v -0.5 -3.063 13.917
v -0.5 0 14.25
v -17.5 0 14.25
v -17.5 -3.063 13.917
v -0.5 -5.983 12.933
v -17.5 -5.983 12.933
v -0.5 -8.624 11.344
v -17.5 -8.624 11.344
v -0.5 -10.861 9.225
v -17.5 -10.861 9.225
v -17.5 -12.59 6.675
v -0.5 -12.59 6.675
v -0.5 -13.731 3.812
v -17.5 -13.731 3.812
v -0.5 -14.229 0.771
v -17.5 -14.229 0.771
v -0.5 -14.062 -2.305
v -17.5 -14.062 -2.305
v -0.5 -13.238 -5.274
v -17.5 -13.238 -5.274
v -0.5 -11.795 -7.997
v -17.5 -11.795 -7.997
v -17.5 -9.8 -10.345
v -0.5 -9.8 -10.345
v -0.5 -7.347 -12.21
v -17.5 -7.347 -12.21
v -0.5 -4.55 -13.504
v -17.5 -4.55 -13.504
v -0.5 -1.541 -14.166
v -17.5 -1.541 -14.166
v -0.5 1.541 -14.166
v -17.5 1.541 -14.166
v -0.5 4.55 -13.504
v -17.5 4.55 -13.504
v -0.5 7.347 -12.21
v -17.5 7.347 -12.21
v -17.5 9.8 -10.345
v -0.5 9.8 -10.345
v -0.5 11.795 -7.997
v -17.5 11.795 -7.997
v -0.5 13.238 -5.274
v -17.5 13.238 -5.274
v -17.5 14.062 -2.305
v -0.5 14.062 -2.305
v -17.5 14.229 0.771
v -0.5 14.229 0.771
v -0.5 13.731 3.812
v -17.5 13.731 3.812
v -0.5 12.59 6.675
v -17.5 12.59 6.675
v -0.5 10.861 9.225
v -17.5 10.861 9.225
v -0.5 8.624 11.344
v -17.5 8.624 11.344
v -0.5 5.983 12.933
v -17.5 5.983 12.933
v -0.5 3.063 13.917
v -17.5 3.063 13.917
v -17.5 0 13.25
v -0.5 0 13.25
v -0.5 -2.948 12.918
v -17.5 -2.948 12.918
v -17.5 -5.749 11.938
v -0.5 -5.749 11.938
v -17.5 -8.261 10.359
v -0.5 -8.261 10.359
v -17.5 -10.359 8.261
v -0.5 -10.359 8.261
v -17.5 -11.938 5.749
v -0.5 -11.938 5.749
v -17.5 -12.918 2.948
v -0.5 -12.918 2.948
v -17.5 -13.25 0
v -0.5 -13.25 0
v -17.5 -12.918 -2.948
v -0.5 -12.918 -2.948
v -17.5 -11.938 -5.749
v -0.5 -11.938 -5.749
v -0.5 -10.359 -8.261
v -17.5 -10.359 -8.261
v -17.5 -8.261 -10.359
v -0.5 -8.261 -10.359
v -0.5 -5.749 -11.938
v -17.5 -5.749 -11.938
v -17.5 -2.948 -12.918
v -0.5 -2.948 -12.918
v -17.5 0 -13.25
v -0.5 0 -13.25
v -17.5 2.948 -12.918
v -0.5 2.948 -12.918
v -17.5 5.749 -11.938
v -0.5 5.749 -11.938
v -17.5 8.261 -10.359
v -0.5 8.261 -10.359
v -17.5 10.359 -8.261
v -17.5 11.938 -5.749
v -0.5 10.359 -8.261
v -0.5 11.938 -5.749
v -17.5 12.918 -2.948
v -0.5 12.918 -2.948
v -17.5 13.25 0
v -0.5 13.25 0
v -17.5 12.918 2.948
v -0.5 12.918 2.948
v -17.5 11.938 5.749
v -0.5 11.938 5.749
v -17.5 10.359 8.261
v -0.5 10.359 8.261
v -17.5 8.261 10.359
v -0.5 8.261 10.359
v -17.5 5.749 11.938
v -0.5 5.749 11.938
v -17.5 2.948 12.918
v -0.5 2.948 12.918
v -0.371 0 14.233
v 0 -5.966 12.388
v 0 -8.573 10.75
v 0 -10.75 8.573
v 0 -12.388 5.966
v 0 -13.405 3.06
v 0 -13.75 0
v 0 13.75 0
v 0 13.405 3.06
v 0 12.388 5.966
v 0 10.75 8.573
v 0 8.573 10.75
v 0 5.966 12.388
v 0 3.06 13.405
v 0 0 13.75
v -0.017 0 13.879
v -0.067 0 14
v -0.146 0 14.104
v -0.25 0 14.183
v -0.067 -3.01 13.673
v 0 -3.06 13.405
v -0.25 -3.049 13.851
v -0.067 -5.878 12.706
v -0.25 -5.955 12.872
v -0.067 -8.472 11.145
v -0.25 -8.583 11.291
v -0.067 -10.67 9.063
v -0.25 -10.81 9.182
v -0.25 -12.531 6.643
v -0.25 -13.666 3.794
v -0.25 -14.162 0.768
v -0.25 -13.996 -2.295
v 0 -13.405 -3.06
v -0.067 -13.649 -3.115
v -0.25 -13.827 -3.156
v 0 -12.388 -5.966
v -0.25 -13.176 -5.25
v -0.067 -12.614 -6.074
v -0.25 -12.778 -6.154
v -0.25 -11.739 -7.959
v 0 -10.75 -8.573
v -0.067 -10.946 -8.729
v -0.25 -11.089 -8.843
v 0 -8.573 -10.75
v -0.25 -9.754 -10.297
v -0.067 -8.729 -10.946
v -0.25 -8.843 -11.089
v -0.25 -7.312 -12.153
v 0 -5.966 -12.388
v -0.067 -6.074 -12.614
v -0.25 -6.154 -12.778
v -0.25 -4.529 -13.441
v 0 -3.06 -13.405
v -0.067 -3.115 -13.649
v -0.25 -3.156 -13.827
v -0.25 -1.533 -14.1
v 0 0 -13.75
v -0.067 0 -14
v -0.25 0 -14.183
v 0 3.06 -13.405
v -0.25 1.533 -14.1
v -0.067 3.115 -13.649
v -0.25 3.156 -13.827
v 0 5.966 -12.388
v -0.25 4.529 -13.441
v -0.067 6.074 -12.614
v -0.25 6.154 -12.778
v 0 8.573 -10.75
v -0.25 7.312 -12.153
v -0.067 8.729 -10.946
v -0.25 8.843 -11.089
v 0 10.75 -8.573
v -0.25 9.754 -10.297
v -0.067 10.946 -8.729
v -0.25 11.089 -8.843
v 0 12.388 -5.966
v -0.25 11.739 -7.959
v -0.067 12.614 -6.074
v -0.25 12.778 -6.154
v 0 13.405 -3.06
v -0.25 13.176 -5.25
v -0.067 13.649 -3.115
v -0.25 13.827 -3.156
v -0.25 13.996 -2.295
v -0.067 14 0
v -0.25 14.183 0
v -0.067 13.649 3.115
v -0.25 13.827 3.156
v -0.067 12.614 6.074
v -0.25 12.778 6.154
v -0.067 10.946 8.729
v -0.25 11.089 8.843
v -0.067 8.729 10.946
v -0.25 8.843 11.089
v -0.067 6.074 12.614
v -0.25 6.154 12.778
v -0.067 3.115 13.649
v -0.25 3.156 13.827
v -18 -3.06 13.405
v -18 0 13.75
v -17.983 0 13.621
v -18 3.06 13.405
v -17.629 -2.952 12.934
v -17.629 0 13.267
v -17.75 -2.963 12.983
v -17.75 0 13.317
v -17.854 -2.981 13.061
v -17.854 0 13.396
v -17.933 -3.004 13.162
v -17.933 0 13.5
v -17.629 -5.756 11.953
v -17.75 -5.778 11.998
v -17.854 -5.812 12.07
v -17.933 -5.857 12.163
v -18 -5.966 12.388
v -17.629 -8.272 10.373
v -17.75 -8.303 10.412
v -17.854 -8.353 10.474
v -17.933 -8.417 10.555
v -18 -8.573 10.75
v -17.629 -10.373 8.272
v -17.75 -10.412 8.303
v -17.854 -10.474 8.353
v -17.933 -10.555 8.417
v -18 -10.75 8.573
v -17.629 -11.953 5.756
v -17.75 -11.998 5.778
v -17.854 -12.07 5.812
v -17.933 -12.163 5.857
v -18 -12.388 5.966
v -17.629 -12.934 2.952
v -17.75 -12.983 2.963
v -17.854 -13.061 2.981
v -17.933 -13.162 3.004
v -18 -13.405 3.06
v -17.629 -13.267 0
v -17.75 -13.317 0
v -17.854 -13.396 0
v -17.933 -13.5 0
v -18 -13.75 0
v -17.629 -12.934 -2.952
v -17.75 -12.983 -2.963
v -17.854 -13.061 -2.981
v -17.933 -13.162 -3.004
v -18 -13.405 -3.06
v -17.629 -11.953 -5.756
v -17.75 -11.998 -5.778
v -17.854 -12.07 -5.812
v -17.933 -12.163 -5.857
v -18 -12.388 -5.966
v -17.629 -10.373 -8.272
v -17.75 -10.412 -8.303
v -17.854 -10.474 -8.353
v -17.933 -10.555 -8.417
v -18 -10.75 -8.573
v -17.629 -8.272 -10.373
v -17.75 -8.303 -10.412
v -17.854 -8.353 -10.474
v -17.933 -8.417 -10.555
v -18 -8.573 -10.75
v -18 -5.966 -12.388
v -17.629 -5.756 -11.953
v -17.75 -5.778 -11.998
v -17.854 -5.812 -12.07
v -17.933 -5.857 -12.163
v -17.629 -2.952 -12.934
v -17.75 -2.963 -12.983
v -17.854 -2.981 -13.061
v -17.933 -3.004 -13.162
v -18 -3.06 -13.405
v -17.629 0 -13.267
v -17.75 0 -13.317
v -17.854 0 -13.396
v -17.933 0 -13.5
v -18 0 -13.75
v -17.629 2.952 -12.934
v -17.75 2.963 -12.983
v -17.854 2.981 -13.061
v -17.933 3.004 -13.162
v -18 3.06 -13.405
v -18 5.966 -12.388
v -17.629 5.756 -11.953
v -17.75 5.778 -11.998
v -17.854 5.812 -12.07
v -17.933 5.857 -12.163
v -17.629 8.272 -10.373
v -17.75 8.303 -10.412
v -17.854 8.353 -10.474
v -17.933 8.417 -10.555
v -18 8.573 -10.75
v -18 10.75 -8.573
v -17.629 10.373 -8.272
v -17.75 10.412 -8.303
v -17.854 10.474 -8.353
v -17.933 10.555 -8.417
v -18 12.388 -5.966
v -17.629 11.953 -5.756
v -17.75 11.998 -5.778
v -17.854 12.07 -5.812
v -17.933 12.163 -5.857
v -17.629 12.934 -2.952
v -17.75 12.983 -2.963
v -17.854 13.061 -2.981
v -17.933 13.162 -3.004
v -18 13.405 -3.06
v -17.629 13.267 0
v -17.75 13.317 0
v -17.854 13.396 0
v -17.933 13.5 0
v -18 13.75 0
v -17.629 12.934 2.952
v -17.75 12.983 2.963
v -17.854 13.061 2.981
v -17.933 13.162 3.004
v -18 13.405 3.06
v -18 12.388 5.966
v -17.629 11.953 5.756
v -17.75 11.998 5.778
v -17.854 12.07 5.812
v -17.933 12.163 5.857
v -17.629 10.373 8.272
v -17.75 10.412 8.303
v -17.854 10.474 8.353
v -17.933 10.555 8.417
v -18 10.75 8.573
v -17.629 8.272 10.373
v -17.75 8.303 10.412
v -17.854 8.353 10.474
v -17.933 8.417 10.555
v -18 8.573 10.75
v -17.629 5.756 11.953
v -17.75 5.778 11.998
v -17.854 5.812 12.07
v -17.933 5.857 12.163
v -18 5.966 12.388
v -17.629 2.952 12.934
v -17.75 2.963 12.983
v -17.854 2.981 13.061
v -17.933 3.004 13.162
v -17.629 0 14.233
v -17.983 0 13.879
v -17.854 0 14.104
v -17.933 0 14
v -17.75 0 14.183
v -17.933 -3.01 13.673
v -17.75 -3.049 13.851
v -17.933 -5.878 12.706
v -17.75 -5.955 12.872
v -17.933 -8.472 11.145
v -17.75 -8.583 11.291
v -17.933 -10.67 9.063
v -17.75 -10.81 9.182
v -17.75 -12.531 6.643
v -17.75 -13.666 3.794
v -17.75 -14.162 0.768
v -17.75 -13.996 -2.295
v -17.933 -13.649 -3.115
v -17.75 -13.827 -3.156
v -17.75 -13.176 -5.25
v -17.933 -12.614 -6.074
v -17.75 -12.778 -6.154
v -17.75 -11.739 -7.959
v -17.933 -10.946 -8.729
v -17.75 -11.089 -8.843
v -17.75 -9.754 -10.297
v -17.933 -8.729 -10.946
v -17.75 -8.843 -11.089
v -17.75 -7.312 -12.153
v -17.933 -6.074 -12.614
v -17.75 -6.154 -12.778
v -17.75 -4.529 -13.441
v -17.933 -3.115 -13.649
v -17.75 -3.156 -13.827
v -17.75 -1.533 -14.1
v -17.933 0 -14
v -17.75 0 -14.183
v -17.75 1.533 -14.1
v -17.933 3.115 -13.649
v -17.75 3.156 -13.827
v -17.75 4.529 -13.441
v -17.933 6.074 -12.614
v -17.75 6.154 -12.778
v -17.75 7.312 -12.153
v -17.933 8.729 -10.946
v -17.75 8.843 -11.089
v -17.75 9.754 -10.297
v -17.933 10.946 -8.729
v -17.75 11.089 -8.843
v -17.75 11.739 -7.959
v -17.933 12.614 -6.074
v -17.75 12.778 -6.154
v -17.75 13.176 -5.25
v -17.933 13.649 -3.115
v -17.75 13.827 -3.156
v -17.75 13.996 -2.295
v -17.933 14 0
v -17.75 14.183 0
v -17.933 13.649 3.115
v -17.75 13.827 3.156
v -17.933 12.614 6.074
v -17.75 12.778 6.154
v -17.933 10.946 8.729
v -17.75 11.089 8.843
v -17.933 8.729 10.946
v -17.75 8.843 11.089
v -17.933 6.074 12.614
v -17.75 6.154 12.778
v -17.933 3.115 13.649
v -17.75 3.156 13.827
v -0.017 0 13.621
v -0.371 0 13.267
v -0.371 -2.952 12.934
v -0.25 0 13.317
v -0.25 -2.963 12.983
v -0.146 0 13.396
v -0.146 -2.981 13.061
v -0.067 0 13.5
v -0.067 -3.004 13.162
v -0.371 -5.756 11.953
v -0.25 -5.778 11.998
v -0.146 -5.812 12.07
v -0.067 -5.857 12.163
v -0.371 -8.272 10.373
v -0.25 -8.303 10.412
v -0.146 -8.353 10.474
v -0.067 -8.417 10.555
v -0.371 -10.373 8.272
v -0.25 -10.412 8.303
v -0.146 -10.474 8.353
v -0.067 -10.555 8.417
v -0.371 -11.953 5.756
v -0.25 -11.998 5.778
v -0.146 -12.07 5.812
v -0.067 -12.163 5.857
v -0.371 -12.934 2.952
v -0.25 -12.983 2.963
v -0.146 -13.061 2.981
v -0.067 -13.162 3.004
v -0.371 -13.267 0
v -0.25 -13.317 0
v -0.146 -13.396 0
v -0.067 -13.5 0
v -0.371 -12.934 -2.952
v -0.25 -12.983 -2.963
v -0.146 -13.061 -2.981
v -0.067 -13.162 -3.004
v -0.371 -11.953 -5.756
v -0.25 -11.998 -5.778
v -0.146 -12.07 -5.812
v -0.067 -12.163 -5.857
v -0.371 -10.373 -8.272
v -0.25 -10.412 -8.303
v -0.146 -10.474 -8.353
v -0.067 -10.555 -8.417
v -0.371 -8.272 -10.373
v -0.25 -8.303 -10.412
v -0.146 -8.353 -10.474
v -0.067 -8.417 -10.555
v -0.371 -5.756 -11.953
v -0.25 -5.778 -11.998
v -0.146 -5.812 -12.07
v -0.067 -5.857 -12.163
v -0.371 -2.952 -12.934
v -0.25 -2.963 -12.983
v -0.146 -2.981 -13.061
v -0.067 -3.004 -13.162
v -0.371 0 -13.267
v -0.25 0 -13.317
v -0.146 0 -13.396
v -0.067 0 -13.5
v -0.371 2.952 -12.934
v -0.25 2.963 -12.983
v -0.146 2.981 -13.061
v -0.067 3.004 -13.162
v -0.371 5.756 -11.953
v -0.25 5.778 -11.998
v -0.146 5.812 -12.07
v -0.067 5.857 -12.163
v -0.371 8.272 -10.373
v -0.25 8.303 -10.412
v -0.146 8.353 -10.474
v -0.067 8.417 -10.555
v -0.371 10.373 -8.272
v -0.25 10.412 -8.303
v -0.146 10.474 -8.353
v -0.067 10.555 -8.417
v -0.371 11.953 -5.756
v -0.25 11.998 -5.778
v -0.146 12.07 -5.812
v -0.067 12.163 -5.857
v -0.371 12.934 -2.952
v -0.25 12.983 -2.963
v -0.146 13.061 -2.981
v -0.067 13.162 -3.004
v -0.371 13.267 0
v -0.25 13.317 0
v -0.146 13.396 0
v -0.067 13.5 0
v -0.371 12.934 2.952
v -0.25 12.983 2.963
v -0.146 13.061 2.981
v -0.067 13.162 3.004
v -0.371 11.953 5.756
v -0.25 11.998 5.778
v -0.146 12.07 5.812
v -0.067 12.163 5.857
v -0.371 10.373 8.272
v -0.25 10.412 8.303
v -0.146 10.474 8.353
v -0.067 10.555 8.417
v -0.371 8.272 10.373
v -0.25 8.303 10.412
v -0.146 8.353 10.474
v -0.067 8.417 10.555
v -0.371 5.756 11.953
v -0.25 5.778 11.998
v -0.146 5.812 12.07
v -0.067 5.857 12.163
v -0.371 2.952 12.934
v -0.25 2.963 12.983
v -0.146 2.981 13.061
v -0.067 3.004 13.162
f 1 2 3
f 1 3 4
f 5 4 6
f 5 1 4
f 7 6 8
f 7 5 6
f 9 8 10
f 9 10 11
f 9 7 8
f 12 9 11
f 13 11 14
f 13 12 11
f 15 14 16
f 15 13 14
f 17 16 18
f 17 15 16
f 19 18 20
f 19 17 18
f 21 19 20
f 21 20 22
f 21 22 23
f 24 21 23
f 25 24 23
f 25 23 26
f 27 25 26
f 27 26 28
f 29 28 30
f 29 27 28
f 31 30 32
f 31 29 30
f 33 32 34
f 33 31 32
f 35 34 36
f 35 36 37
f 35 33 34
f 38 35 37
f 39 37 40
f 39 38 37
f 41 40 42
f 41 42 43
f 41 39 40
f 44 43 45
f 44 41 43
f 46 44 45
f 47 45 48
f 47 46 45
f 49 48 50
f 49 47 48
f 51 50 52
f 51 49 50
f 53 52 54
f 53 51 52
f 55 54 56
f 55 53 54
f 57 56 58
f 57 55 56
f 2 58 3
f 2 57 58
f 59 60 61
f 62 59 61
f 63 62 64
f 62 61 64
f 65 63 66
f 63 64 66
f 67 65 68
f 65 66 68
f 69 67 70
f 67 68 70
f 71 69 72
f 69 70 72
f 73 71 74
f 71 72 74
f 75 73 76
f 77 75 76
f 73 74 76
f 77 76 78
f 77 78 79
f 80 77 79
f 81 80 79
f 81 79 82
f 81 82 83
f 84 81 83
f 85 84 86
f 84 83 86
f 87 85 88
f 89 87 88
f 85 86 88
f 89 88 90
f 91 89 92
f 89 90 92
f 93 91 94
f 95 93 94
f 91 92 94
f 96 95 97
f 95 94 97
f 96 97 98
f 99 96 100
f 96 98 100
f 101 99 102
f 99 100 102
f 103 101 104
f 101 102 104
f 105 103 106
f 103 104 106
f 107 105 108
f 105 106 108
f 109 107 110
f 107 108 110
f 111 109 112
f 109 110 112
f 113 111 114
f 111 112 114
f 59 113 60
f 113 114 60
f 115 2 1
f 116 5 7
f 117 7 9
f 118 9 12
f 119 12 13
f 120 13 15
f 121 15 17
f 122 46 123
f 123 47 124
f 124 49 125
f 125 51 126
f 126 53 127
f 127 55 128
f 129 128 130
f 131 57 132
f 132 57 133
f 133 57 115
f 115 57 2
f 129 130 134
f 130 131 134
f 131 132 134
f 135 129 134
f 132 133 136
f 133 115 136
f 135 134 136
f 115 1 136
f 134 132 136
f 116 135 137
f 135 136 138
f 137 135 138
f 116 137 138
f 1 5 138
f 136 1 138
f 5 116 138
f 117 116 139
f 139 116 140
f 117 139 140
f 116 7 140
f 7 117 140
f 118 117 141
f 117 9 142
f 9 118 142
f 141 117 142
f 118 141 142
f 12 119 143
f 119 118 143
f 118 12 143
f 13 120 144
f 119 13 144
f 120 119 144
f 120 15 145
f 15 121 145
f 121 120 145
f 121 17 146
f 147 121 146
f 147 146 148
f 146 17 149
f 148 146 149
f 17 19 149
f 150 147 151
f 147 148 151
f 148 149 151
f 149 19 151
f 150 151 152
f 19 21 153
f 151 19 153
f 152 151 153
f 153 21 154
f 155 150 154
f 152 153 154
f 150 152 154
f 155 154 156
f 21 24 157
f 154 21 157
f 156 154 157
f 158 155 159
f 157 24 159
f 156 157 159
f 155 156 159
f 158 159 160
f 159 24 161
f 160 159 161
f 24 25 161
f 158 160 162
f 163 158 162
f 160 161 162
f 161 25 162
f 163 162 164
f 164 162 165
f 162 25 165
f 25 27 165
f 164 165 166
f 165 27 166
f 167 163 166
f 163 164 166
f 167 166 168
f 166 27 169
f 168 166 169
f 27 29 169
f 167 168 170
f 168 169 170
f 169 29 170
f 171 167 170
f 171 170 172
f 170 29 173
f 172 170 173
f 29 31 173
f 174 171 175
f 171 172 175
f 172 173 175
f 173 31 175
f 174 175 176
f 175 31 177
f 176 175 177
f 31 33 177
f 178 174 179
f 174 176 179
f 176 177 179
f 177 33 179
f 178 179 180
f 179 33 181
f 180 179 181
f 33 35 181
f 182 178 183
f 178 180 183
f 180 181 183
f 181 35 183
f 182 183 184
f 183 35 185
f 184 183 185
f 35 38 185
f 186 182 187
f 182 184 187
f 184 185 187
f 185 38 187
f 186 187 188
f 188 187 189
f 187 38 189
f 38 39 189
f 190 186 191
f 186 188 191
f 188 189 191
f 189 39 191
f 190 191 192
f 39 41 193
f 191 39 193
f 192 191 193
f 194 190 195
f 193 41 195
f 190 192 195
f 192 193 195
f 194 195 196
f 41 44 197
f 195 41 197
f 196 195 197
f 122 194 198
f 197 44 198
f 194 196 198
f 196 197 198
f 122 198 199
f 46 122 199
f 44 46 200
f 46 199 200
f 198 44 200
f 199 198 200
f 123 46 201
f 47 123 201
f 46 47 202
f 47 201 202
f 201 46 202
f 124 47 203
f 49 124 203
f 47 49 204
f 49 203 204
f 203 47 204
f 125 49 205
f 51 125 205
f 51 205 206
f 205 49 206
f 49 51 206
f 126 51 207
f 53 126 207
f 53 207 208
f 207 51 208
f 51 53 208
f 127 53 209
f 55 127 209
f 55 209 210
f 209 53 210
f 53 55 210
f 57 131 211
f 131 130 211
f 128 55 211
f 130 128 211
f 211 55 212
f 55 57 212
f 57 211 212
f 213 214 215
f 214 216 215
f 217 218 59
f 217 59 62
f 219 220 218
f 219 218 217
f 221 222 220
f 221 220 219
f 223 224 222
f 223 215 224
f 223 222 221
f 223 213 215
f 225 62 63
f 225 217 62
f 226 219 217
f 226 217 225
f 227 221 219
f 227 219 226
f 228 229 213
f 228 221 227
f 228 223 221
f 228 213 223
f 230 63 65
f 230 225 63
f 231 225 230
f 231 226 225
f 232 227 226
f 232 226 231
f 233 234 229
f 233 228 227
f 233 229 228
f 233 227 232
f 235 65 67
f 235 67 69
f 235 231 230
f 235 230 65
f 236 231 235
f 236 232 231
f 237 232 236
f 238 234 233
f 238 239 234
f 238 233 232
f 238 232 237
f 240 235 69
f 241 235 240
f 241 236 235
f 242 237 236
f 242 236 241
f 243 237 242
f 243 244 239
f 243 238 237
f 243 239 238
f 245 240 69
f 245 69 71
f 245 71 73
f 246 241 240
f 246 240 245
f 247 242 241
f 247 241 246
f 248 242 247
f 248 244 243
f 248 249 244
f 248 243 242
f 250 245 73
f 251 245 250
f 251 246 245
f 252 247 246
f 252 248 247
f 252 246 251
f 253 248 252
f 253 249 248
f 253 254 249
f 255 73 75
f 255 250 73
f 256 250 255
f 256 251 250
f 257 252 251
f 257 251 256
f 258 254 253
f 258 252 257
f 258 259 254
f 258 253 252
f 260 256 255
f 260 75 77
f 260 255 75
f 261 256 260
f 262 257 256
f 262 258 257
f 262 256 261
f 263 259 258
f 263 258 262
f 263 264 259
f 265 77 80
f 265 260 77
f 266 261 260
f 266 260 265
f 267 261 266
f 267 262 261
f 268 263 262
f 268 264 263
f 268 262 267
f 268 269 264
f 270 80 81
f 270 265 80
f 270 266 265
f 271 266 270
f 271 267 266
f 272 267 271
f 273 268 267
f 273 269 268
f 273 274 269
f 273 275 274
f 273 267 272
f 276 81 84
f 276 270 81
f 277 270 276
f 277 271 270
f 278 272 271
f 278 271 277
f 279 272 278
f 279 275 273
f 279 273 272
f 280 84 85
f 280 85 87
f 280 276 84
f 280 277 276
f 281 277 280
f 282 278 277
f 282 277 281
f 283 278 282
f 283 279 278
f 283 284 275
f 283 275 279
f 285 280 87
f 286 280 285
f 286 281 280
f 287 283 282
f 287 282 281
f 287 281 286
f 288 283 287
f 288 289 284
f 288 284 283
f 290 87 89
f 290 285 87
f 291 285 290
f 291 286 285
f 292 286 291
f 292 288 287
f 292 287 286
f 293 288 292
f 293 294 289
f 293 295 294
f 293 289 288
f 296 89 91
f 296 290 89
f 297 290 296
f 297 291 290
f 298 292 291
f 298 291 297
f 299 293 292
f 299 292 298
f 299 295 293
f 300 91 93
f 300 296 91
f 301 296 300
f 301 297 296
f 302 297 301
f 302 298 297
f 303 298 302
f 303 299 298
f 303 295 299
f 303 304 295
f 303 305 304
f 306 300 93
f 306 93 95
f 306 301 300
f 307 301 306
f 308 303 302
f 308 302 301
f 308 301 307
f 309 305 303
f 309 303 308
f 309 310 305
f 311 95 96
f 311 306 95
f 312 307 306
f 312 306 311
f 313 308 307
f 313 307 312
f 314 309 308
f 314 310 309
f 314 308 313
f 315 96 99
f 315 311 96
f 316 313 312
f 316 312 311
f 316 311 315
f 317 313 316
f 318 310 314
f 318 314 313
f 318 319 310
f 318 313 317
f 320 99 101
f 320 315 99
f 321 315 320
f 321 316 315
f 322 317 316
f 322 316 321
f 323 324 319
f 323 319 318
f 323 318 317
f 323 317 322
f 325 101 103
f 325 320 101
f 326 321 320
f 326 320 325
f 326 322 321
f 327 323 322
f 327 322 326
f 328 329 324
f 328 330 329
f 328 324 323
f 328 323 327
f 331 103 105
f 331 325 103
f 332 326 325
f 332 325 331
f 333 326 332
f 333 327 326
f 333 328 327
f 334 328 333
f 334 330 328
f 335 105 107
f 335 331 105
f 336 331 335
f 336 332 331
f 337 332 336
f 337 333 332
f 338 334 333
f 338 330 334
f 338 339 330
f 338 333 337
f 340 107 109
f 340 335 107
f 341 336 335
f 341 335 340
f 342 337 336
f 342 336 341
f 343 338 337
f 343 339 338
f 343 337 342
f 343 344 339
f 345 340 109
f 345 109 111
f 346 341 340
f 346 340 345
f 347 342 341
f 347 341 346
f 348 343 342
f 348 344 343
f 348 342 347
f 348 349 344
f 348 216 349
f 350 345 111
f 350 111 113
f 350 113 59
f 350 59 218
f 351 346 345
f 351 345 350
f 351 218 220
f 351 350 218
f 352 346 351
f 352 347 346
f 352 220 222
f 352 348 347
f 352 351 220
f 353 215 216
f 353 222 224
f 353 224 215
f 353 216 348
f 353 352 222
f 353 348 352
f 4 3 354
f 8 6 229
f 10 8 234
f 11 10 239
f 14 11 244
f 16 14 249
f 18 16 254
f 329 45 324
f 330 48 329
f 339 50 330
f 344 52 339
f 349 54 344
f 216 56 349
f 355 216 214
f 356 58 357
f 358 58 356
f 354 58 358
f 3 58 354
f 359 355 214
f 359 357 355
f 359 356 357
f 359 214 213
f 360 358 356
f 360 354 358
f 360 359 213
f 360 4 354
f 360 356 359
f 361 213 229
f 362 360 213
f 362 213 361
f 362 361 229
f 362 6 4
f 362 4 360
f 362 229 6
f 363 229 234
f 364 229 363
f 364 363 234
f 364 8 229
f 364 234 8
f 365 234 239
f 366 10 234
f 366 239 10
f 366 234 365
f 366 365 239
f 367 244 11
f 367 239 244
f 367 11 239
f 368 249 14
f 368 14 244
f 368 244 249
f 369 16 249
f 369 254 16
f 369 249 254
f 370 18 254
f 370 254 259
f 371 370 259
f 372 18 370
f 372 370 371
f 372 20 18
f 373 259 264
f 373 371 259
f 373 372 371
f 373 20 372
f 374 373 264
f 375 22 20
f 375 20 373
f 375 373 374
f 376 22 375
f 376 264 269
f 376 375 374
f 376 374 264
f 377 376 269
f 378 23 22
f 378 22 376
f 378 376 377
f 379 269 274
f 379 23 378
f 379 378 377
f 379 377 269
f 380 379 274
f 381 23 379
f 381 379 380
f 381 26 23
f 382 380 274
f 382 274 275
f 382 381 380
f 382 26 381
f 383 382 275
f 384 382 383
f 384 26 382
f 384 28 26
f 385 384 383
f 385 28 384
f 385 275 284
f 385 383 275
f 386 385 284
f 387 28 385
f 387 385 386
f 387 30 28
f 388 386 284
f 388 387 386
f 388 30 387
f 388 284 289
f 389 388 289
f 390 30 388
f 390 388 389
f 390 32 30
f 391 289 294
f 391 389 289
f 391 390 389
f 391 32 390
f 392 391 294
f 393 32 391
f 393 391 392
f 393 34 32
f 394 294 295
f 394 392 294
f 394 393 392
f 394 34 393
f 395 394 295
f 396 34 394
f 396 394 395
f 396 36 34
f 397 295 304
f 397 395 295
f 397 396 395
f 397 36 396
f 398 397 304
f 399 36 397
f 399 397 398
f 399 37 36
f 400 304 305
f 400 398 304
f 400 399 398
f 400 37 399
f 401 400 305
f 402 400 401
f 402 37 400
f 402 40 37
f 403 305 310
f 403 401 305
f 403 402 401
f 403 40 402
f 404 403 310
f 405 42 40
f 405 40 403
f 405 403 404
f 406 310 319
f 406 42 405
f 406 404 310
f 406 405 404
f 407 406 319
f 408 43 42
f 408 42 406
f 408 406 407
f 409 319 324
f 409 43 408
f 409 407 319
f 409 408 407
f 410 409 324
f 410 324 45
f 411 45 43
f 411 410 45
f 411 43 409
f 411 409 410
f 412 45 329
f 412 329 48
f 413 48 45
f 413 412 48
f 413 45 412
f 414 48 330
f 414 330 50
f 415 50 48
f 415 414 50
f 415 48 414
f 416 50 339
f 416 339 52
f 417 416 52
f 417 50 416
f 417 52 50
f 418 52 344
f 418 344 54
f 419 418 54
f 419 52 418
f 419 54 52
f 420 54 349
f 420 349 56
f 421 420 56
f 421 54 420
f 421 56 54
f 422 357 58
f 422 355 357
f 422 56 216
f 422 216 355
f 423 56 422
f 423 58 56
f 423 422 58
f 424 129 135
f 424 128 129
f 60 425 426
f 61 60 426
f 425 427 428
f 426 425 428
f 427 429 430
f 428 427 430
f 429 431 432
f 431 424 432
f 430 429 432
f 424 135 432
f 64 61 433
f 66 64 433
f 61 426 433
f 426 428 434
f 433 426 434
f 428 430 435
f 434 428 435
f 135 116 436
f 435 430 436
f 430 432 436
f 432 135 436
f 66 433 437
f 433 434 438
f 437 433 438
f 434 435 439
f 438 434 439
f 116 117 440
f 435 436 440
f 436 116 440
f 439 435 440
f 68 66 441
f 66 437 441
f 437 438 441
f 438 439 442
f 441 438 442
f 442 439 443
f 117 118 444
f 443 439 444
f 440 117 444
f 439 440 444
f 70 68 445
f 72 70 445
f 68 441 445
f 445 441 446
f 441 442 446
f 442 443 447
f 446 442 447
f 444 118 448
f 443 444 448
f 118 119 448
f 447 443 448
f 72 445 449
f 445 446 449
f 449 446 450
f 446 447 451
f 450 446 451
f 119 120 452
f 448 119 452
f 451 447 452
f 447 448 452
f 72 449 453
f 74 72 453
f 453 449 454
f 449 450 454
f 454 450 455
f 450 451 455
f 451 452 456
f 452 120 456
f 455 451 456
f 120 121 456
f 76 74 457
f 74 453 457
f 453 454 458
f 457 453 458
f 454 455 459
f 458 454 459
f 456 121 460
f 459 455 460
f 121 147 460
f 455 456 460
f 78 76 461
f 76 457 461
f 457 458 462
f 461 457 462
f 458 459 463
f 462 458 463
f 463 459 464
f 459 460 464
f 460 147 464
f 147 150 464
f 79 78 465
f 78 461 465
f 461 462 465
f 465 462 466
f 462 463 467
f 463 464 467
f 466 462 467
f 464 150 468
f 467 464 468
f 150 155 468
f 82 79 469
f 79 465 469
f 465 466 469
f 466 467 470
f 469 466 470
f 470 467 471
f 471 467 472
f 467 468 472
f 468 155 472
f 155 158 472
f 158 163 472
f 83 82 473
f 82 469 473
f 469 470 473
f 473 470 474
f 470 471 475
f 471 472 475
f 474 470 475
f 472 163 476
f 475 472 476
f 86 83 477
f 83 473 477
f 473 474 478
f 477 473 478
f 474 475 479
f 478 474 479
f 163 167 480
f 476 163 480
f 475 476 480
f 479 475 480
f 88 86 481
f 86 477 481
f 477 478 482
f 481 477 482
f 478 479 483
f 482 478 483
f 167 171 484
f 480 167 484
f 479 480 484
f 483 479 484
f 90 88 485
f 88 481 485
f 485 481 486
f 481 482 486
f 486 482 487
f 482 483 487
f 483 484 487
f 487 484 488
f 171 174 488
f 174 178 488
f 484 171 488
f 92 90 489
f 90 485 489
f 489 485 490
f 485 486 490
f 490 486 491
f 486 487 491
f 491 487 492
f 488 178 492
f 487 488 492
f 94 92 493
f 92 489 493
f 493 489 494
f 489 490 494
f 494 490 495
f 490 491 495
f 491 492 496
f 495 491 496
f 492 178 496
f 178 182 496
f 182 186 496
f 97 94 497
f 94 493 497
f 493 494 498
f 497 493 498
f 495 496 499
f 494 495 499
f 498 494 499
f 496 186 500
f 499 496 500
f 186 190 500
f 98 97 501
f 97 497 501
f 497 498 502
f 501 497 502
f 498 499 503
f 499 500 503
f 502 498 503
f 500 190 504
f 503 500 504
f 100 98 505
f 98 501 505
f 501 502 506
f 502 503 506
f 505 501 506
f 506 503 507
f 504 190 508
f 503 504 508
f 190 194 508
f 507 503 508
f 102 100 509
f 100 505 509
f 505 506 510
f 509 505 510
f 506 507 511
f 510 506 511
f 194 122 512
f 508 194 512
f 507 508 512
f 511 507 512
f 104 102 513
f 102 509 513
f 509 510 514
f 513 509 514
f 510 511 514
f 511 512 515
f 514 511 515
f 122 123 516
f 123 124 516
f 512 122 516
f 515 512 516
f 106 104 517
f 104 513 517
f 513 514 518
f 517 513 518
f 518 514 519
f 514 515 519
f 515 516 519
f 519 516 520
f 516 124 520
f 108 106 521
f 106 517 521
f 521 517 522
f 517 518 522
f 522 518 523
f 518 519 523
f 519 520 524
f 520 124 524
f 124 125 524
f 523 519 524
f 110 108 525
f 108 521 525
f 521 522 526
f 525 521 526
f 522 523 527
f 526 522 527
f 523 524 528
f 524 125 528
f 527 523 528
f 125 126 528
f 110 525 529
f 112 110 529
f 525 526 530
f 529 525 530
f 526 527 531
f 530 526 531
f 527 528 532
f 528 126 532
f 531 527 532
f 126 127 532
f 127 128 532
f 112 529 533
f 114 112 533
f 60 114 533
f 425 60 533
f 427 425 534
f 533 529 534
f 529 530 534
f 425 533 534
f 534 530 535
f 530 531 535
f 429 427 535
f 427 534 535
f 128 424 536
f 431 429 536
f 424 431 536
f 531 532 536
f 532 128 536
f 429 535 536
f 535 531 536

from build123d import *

# Parameters (mm, degrees)
F0_W = 18
F0_H = 1
F2_R = 0.49999
F3_R = 0.49999


# Not quite as in the source:
# - a fillet or chamfer is up to 0.001 mm smaller than in the source, because OpenCascade refuses the exact size


with BuildPart() as f1:
    # F0 (on Front) → F1 (revolve)
    with BuildSketch(Plane.XZ):
        with Locations((-9, 13.75)):
            Rectangle(F0_W, F0_H)
    revolve(axis=Axis((-8.2086159056, 0, 0), (1, 0, 0)))

    # F2 (radius 0.5 in the source; OpenCascade refuses exactly that, so slightly less here)
    f2_edges = [f1.edges().sort_by_distance(p)[0] for p in [
        (0, 0, -13.25),
        (0, 0, -14.25),
    ]]
    fillet(f2_edges, radius=F2_R)

    # F3 (radius 0.5 in the source; OpenCascade refuses exactly that, so slightly less here)
    f3_edges = [f1.edges().sort_by_distance(p)[0] for p in [
        (-18, 0, -14.25),
        (-18, 0, -13.25),
    ]]
    fillet(f3_edges, radius=F3_R)


solid = f1.part
